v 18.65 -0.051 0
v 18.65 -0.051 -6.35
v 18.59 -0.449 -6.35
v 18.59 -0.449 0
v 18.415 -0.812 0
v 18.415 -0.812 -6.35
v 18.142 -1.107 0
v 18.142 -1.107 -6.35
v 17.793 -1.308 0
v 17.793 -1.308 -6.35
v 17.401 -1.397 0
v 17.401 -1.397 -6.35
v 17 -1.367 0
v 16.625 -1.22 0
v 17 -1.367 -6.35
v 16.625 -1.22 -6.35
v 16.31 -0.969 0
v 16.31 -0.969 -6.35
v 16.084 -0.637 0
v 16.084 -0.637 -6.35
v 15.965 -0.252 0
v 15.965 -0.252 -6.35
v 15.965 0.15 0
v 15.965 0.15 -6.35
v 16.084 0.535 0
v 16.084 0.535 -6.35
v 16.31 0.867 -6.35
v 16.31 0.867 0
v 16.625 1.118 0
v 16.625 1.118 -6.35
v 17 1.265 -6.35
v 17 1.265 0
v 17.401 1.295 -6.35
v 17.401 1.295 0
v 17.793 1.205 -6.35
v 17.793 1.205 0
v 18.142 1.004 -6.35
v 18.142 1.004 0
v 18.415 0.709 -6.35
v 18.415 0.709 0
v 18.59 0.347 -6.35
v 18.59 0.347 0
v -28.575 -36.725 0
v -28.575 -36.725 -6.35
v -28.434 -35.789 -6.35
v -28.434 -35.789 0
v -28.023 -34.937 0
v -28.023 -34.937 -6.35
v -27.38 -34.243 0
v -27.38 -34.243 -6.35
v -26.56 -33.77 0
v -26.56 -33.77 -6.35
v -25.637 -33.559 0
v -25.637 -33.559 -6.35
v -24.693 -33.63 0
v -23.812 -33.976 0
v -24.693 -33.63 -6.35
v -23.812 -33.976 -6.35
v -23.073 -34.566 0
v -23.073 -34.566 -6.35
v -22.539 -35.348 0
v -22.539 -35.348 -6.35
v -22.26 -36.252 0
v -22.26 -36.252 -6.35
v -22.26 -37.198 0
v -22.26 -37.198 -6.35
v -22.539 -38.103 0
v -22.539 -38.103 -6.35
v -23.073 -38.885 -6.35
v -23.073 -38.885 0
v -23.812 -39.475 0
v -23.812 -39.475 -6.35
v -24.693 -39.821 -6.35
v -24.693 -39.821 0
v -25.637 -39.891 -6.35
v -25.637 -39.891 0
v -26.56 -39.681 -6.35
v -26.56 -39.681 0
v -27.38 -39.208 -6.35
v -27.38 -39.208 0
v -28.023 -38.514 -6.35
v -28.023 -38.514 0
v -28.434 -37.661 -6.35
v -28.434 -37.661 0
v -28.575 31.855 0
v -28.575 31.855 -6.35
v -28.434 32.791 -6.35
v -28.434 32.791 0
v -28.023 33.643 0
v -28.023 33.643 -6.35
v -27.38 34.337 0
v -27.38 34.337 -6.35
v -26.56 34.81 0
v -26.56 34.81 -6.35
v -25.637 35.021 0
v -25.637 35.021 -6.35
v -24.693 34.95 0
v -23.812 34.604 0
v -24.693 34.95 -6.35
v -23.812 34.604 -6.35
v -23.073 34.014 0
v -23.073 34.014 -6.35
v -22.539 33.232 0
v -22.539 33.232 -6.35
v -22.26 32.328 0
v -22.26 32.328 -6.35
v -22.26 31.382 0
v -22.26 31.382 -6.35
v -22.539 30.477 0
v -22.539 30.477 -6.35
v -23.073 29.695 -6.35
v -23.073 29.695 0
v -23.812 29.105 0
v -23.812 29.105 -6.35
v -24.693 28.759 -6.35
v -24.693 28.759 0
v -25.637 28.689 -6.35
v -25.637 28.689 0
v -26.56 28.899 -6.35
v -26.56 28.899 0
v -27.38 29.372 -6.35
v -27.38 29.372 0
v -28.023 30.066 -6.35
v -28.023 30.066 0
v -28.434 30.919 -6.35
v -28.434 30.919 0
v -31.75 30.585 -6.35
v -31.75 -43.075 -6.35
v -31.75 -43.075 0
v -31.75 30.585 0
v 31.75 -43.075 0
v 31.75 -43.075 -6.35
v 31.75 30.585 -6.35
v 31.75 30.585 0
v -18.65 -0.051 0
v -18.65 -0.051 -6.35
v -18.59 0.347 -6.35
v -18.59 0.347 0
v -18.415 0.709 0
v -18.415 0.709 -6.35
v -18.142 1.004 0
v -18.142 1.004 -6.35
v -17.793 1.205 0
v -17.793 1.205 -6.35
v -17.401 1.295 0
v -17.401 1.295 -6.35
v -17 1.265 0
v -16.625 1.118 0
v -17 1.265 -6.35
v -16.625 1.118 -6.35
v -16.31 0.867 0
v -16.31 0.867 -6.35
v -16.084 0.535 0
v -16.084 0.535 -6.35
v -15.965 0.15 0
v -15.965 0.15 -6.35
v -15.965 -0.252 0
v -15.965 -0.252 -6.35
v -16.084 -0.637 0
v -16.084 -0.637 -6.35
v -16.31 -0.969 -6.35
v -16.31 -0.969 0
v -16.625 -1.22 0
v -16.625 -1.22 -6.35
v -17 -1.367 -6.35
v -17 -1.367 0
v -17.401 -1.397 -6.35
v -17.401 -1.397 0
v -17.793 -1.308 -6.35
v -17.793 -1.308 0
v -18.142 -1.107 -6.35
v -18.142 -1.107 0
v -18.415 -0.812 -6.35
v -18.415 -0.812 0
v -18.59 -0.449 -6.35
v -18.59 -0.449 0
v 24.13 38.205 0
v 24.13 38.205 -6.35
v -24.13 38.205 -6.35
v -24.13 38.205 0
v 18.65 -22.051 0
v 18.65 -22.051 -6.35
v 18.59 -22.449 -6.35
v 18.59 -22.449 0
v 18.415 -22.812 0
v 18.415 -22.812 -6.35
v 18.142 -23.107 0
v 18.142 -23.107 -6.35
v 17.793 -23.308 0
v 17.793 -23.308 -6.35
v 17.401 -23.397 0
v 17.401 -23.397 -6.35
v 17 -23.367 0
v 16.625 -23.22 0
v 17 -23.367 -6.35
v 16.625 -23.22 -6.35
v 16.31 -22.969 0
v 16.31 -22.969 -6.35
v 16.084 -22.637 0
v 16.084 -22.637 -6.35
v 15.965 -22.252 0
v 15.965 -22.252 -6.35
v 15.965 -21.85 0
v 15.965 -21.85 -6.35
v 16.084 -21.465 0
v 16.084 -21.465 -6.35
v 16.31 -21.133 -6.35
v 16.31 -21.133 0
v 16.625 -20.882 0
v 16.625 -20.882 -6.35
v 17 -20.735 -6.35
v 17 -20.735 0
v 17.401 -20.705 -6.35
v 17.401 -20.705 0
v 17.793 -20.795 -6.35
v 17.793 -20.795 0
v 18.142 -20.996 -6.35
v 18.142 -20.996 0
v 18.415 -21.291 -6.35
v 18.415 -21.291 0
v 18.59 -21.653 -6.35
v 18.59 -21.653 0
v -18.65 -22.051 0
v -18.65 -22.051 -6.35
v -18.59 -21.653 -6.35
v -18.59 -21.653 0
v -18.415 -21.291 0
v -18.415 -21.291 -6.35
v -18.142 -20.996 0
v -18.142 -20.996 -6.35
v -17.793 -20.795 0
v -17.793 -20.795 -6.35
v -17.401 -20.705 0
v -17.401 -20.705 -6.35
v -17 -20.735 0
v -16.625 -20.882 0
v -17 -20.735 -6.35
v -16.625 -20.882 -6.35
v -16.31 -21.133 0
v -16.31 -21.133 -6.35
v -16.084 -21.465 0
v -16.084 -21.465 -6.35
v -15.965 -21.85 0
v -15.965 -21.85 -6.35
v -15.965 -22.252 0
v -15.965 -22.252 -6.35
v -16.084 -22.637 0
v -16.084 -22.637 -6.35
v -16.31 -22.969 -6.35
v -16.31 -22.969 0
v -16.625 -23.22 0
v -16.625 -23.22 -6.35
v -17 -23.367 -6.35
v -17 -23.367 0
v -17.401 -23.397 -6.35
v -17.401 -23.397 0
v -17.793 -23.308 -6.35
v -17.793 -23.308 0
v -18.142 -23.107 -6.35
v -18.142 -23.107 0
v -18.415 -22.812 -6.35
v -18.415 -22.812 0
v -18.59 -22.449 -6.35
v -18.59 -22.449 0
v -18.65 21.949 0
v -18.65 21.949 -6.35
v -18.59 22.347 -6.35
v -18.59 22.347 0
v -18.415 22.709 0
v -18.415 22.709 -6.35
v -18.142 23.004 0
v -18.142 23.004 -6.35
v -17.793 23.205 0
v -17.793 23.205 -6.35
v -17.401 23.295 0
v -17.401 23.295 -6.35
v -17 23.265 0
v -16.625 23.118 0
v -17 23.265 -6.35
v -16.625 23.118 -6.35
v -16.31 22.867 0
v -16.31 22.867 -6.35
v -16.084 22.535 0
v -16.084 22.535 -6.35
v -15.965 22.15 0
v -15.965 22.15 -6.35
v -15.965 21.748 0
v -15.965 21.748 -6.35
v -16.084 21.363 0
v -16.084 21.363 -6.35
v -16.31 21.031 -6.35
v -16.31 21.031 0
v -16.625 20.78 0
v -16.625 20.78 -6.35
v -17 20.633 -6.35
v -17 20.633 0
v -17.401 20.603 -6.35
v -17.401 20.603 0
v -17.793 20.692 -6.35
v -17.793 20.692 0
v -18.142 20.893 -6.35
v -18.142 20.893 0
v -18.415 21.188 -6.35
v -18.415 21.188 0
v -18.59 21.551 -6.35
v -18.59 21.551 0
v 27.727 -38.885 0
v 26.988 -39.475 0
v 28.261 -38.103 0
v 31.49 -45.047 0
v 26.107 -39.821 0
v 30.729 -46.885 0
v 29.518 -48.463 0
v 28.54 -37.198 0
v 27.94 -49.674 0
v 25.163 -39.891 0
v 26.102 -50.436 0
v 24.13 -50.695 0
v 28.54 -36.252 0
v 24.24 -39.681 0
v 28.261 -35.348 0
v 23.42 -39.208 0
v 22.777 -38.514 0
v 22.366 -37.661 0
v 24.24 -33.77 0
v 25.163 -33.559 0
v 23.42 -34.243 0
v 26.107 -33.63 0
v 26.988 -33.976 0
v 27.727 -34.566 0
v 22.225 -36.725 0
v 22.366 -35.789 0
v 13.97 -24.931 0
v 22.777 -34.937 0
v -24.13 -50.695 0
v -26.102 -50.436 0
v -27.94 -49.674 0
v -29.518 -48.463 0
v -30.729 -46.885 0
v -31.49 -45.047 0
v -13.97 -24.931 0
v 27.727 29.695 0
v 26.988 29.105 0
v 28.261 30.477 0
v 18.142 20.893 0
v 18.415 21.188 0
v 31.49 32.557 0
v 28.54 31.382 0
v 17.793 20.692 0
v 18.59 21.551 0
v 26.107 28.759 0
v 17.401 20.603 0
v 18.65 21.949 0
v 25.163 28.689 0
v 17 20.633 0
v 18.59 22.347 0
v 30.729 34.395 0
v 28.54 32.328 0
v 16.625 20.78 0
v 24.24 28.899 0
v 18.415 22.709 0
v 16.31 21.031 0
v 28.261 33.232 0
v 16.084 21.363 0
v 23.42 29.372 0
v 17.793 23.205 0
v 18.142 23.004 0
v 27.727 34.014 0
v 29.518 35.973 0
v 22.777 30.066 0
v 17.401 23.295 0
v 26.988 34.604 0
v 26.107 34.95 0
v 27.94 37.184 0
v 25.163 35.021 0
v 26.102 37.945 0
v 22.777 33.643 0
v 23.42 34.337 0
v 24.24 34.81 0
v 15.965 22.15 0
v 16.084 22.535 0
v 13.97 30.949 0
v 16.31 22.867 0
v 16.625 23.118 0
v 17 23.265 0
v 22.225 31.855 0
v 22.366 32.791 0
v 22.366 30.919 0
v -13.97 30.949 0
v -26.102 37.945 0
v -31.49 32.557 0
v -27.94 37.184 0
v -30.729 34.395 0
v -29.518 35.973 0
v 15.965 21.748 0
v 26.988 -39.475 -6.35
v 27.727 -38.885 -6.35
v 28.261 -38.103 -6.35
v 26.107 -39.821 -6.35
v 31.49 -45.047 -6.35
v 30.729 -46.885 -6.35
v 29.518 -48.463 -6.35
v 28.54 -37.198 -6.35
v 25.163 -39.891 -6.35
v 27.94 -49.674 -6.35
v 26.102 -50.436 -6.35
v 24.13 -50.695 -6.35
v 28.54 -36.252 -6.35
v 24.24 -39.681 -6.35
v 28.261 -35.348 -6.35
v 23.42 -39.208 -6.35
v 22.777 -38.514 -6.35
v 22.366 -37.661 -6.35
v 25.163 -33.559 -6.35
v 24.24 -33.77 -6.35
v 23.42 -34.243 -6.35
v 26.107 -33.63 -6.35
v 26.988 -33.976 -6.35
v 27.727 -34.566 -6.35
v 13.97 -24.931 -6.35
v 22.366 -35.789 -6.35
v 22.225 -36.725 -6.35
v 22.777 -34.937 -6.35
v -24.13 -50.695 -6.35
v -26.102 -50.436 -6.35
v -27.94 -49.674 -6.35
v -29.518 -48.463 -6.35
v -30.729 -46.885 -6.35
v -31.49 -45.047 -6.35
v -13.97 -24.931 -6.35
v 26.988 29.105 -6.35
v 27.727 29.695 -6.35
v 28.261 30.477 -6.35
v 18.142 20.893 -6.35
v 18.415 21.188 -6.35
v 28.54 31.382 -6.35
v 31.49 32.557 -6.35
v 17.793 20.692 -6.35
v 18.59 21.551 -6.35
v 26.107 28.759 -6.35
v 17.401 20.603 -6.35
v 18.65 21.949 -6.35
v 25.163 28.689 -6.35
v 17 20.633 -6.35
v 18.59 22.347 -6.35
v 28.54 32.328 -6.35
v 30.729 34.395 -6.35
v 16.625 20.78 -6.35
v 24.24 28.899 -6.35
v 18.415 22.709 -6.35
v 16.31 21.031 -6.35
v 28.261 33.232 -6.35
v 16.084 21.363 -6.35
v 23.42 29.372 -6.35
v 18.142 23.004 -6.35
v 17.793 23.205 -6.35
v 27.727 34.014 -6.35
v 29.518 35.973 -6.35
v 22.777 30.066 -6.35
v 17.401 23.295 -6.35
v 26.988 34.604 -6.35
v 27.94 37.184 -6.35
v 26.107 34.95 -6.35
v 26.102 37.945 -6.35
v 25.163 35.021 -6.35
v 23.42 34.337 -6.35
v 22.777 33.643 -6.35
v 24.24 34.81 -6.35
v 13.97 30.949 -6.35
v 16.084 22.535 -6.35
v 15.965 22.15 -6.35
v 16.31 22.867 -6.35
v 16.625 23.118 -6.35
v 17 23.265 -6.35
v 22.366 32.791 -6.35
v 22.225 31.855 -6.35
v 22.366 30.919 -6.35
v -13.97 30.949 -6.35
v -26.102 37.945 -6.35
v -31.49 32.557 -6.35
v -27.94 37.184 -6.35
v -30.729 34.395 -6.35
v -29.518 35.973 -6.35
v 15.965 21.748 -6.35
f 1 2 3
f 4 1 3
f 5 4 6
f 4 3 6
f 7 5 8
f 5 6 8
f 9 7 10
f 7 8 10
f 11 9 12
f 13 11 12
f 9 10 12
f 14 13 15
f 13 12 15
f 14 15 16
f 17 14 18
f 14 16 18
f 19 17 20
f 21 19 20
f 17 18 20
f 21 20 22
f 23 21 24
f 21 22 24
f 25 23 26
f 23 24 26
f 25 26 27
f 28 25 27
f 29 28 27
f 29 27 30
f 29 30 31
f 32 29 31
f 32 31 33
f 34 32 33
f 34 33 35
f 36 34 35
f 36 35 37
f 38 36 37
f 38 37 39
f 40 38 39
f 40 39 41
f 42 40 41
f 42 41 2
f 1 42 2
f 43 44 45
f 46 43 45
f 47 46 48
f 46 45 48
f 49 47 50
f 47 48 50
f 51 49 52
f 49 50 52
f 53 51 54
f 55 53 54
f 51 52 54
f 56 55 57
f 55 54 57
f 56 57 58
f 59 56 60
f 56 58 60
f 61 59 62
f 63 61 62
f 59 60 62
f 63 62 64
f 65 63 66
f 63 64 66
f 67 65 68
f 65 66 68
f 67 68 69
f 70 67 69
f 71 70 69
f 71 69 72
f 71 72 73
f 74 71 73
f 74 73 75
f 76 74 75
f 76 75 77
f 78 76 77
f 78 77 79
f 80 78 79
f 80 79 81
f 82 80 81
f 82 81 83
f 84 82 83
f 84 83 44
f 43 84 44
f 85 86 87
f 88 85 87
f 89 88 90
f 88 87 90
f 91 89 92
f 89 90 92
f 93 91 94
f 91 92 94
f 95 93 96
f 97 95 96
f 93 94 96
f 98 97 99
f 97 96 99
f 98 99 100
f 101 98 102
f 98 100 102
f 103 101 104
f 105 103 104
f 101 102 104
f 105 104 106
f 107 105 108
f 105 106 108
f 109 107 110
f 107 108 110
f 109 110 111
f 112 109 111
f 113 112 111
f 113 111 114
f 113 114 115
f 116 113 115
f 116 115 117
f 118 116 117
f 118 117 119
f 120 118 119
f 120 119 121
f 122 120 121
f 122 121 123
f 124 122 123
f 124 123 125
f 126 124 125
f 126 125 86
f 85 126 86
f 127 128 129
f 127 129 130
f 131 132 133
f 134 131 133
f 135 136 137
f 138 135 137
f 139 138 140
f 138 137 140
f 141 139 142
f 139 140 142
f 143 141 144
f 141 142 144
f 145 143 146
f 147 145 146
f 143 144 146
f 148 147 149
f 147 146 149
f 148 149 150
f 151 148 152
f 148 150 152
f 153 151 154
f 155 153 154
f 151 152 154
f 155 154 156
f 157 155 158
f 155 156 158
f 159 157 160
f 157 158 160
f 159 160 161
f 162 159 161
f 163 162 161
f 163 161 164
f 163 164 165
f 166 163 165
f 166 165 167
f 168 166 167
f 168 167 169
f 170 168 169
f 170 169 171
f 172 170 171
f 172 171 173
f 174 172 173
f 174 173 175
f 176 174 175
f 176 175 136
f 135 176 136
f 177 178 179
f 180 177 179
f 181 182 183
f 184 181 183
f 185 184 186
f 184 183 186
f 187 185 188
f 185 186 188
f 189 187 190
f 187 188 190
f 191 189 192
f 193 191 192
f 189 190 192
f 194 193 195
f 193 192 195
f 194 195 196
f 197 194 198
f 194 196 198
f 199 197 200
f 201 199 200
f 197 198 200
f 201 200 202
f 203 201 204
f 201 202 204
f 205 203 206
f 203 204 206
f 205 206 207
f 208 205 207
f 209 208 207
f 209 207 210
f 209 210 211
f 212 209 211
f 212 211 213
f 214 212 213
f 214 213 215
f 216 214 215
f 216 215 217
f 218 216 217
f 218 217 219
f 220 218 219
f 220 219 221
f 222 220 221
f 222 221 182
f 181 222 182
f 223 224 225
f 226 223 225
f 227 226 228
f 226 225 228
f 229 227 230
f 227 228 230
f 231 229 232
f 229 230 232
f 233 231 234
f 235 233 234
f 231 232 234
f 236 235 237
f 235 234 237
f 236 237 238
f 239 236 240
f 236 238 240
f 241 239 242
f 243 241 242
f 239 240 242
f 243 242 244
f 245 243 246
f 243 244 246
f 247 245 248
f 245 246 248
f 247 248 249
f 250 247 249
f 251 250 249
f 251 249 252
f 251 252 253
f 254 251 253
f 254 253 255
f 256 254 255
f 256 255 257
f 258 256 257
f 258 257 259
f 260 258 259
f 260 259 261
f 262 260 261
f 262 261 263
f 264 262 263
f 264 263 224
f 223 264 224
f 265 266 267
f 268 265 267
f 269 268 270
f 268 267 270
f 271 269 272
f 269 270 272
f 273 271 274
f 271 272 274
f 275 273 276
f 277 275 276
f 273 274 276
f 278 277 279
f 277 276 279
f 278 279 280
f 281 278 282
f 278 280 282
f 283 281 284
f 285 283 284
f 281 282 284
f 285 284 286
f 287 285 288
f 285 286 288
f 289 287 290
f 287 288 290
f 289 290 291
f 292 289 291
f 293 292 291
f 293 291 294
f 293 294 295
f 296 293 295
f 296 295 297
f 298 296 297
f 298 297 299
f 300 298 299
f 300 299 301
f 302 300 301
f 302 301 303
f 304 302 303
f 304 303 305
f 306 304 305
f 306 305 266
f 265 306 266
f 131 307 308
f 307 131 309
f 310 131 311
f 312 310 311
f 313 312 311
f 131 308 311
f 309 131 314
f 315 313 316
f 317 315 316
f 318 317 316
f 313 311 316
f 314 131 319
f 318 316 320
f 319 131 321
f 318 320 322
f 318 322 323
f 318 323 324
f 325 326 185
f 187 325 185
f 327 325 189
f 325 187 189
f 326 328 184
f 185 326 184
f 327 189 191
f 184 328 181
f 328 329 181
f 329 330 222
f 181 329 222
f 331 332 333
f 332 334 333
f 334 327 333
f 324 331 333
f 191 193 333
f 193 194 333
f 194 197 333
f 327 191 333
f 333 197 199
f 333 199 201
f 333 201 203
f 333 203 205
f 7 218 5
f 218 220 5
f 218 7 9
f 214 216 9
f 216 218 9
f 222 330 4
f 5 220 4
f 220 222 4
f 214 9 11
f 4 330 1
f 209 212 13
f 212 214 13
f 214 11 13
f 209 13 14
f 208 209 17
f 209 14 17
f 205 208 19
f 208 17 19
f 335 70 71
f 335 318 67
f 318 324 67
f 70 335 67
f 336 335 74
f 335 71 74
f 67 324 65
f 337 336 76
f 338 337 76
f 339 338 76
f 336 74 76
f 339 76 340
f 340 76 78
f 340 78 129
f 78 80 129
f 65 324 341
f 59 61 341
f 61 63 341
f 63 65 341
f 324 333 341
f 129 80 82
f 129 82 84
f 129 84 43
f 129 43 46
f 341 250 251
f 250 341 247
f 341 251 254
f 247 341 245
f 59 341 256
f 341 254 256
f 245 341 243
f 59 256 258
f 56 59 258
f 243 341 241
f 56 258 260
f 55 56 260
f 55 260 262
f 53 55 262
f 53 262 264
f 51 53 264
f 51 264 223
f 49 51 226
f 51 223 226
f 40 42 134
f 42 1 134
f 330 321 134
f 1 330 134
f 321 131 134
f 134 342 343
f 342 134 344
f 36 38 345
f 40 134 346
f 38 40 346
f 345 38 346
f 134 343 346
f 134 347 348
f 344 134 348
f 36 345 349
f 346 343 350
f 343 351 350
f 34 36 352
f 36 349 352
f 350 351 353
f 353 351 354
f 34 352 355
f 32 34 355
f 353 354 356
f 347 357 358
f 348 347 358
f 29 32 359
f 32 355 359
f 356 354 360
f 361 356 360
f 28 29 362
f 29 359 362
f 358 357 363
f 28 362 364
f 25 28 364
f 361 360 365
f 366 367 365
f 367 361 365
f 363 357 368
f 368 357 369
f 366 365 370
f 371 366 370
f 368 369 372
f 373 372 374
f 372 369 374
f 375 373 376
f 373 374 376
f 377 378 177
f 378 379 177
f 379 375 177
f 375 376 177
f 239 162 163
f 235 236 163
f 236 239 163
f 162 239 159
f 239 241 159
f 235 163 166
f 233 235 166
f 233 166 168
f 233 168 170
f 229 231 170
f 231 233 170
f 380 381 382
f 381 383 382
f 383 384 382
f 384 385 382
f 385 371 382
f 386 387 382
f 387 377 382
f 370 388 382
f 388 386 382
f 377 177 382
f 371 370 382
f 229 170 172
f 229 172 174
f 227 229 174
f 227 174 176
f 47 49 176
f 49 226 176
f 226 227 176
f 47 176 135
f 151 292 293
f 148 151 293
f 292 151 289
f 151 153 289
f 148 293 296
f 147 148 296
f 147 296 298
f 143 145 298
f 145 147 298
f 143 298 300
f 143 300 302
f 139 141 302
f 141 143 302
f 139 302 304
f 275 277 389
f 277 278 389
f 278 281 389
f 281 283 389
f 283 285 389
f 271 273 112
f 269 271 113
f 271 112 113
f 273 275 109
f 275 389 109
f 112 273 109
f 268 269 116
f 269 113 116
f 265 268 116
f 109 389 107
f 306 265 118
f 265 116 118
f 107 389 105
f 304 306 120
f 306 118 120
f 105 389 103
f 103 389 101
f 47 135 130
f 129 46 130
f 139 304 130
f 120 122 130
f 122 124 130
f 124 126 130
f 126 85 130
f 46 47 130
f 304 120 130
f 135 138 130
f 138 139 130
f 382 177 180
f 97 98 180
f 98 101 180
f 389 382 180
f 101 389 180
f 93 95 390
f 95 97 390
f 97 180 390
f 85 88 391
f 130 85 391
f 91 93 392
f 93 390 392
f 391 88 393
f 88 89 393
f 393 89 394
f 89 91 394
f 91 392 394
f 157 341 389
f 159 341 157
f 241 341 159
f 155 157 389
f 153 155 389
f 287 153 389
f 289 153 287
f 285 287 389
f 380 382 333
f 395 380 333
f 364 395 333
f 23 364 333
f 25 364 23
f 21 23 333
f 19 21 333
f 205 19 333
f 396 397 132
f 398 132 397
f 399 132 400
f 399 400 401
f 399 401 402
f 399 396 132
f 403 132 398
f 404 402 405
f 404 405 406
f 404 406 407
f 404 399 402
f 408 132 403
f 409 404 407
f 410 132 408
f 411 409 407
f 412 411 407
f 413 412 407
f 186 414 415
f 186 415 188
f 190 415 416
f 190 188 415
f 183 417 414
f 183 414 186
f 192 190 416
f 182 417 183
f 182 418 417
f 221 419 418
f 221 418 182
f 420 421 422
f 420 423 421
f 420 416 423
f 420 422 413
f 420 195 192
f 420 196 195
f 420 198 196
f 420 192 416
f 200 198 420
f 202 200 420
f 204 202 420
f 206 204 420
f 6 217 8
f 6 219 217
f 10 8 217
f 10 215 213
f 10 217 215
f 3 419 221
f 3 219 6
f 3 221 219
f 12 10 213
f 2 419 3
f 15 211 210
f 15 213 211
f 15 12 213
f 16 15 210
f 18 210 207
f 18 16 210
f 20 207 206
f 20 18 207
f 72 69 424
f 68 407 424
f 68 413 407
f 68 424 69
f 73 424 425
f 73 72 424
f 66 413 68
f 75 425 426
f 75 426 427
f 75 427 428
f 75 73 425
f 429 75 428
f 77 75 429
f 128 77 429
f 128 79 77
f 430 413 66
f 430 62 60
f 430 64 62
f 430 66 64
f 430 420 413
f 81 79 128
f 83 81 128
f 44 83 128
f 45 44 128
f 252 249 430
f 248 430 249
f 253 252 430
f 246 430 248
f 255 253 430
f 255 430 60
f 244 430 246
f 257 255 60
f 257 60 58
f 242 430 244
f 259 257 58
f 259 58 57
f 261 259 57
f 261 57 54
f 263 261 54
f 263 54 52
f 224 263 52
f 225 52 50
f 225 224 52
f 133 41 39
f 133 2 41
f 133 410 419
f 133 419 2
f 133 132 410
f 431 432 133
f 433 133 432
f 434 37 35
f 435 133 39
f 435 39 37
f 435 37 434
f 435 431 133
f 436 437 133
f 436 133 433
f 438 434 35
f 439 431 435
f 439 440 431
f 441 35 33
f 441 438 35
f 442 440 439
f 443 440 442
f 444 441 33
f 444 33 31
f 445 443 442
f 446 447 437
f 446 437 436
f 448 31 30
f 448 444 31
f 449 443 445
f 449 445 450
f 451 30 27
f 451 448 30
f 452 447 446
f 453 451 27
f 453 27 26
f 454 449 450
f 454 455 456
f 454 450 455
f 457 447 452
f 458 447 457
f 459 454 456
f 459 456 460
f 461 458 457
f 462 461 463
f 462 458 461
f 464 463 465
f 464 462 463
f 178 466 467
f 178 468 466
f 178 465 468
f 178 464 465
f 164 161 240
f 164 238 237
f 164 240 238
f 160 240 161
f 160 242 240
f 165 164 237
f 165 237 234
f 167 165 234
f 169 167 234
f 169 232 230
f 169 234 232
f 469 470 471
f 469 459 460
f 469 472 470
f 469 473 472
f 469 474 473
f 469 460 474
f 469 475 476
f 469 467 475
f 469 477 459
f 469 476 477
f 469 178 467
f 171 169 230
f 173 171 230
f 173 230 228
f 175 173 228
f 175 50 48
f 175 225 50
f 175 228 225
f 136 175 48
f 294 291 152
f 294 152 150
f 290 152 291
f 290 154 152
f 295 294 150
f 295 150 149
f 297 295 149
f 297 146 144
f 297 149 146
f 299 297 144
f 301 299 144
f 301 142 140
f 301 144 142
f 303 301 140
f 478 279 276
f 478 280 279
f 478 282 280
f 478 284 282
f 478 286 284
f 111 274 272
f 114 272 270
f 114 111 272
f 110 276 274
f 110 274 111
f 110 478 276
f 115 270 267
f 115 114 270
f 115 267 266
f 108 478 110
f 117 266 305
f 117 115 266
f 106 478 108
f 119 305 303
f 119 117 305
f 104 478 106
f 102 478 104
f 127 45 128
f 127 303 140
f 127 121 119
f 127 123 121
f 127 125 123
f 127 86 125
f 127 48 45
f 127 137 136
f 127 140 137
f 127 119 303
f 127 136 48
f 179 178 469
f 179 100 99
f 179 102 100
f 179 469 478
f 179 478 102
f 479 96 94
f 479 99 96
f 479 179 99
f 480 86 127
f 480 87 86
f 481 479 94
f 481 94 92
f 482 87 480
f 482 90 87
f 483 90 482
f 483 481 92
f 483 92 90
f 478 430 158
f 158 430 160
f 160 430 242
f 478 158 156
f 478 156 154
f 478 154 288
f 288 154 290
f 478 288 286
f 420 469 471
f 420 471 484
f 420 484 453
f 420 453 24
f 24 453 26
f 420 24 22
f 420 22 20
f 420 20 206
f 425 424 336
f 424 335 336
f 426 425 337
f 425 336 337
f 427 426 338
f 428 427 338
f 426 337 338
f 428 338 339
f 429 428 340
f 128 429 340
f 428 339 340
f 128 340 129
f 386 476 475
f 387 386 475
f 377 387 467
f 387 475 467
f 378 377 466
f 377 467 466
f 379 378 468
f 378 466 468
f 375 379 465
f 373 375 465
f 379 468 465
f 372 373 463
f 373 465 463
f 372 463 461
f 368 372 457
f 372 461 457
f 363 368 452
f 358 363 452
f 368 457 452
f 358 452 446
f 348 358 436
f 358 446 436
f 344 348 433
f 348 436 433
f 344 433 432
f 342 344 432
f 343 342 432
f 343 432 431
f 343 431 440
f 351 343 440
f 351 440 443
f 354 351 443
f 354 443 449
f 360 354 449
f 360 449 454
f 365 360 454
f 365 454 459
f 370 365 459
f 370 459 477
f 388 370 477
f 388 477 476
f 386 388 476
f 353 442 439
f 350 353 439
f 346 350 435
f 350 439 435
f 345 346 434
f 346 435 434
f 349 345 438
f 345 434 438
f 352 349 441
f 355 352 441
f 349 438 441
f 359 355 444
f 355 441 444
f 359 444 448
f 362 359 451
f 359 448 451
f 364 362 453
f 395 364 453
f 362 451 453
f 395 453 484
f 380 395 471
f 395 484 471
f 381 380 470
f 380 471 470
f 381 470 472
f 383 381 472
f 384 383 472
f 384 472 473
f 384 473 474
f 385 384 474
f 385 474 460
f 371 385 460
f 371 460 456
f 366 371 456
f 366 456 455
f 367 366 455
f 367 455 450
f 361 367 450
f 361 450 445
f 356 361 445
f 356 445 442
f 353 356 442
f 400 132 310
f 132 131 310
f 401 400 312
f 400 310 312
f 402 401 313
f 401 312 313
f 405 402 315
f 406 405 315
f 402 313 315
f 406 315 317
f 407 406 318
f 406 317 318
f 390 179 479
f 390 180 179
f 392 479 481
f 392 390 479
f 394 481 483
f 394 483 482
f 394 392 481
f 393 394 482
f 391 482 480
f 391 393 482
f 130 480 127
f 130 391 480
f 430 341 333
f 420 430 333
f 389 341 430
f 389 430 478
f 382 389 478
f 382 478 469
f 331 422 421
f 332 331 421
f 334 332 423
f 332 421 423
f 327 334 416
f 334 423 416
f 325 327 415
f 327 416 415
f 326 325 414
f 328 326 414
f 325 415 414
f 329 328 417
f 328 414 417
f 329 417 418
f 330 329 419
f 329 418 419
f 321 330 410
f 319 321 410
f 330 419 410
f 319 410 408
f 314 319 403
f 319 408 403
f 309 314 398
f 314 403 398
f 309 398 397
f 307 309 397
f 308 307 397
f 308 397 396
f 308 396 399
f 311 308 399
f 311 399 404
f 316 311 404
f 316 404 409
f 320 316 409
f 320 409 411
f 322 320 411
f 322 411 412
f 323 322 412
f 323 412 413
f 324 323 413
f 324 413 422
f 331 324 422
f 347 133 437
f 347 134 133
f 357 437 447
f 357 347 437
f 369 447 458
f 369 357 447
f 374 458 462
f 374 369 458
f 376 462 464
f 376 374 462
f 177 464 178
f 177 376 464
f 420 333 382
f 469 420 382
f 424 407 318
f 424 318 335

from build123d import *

# Parameters (mm, degrees)
BOSS_EXTRUDE1_DEPTH = 6.35
SKETCH2_R           = 1.35
SKETCH2_R_2         = 1.385
CUT_EXTRUDE1_DEPTH  = 38.116505762
SKETCH3_W           = 63.5
SKETCH3_H           = 88.9
SKETCH3_W_2         = 38.321076004
SKETCH3_H_2         = 47.237540142
BOSS_EXTRUDE2_DEPTH = 6.35
SKETCH5_W           = 27.94
SKETCH5_H           = 55.88
CUT_EXTRUDE3_DEPTH  = 61.153053743
SKETCH6_R           = 3.175
CUT_EXTRUDE4_DEPTH  = 61.153053743
FILLET2_R           = 7.62


with BuildPart() as part:
    # Sketch1 → Boss-Extrude1 (new body)
    with BuildSketch(Plane.XY):
        with BuildLine():
            Line((-19.69889026, 23.2987845), (-14.850045261, 29.75147823))
            ThreePointArc((-14.850045261, 29.75147823), (-14.144755454, 30.339267512), (-13.251155001, 30.55))
            Line((-13.251155001, 30.55), (13.251155001, 30.55))
            ThreePointArc((13.251155001, 30.55), (14.144755454, 30.339267512), (14.850045261, 29.75147823))
            Line((14.850045261, 29.75147823), (19.69889026, 23.2987845))
            ThreePointArc((19.69889026, 23.2987845), (19.997074131, 22.730638521), (20.1, 22.09730627))
            Line((20.1, 22.09730627), (20.1, -22.09730627))
            ThreePointArc((20.1, -22.09730627), (19.997074131, -22.730638521), (19.69889026, -23.2987845))
            Line((19.69889026, -23.2987845), (14.850045261, -29.75147823))
            ThreePointArc((14.850045261, -29.75147823), (14.144755454, -30.339267512), (13.251155001, -30.55))
            Line((13.251155001, -30.55), (-13.251155001, -30.55))
            ThreePointArc((-13.251155001, -30.55), (-14.144755454, -30.339267512), (-14.850045261, -29.75147823))
            Line((-14.850045261, -29.75147823), (-19.69889026, -23.2987845))
            ThreePointArc((-19.69889026, -23.2987845), (-19.997074131, -22.730638521), (-20.1, -22.09730627))
            Line((-20.1, -22.09730627), (-20.1, 22.09730627))
            ThreePointArc((-20.1, 22.09730627), (-19.997074131, 22.730638521), (-19.69889026, 23.2987845))
        make_face()
    extrude(amount=-BOSS_EXTRUDE1_DEPTH)

    # Sketch2 → Cut-Extrude1 (cut, through all)
    with BuildSketch(Plane(origin=(0, 0, -6.35), x_dir=(-1, 0, 0), z_dir=(0, 0, -1))):
        with Locations((17.3, 21.9487845)):
            Circle(SKETCH2_R)
        with Locations((17.3, -0.0512155)):
            Circle(SKETCH2_R)
        with Locations((17.3, -22.0512155)):
            Circle(SKETCH2_R)
        with Locations((11, -27.75)):
            Circle(SKETCH2_R_2)
        with Locations(Location((-11, -27.75, 0), (0, 0, 180))):
            Circle(SKETCH2_R_2)
        with Locations(Location((-17.3, -22.0512155, 0), (0, 0, 180))):
            Circle(SKETCH2_R)
        with Locations(Location((-17.3, -0.0512155, 0), (0, 0, 180))):
            Circle(SKETCH2_R)
        with Locations(Location((-17.3, 21.9487845, 0), (0, 0, 180))):
            Circle(SKETCH2_R)
    extrude(amount=-CUT_EXTRUDE1_DEPTH, mode=Mode.SUBTRACT)

    # Sketch3 → Boss-Extrude2 (add)
    with BuildSketch(Plane(origin=(0, 0, -6.35), x_dir=(-1, 0, 0), z_dir=(0, 0, -1))):
        with Locations((0, -6.2452155)):
            Rectangle(SKETCH3_W, SKETCH3_H)
        Rectangle(SKETCH3_W_2, SKETCH3_H_2, mode=Mode.SUBTRACT)
    extrude(amount=-BOSS_EXTRUDE2_DEPTH)

    # Sketch5 → Cut-Extrude3 (cut, through all)
    with BuildSketch(Plane.XY):
        with Locations((0, 3.0087845)):
            Rectangle(SKETCH5_W, SKETCH5_H)
    extrude(amount=-CUT_EXTRUDE3_DEPTH, mode=Mode.SUBTRACT)

    # Sketch6 → Cut-Extrude4 (cut, through all)
    with BuildSketch(Plane(origin=(0, 0, -6.35), x_dir=(-1, 0, 0), z_dir=(0, 0, -1))):
        with Locations((25.4, 31.8547845)):
            Circle(SKETCH6_R)
        with Locations((-25.4, 31.8547845)):
            Circle(SKETCH6_R)
        with Locations((-25.4, -36.7252155)):
            Circle(SKETCH6_R)
        with Locations((25.4, -36.7252155)):
            Circle(SKETCH6_R)
    extrude(amount=-CUT_EXTRUDE4_DEPTH, mode=Mode.SUBTRACT)

    # Fillet2
    fillet2_edges = [part.edges().sort_by_distance(p)[0] for p in [
        (-31.75, 38.2047845, -3.175),
        (-31.75, -50.6952155, -3.175),
        (31.75, -50.6952155, -3.175),
        (31.75, 38.2047845, -3.175),
    ]]
    fillet(fillet2_edges, radius=FILLET2_R)


solid = part.part
